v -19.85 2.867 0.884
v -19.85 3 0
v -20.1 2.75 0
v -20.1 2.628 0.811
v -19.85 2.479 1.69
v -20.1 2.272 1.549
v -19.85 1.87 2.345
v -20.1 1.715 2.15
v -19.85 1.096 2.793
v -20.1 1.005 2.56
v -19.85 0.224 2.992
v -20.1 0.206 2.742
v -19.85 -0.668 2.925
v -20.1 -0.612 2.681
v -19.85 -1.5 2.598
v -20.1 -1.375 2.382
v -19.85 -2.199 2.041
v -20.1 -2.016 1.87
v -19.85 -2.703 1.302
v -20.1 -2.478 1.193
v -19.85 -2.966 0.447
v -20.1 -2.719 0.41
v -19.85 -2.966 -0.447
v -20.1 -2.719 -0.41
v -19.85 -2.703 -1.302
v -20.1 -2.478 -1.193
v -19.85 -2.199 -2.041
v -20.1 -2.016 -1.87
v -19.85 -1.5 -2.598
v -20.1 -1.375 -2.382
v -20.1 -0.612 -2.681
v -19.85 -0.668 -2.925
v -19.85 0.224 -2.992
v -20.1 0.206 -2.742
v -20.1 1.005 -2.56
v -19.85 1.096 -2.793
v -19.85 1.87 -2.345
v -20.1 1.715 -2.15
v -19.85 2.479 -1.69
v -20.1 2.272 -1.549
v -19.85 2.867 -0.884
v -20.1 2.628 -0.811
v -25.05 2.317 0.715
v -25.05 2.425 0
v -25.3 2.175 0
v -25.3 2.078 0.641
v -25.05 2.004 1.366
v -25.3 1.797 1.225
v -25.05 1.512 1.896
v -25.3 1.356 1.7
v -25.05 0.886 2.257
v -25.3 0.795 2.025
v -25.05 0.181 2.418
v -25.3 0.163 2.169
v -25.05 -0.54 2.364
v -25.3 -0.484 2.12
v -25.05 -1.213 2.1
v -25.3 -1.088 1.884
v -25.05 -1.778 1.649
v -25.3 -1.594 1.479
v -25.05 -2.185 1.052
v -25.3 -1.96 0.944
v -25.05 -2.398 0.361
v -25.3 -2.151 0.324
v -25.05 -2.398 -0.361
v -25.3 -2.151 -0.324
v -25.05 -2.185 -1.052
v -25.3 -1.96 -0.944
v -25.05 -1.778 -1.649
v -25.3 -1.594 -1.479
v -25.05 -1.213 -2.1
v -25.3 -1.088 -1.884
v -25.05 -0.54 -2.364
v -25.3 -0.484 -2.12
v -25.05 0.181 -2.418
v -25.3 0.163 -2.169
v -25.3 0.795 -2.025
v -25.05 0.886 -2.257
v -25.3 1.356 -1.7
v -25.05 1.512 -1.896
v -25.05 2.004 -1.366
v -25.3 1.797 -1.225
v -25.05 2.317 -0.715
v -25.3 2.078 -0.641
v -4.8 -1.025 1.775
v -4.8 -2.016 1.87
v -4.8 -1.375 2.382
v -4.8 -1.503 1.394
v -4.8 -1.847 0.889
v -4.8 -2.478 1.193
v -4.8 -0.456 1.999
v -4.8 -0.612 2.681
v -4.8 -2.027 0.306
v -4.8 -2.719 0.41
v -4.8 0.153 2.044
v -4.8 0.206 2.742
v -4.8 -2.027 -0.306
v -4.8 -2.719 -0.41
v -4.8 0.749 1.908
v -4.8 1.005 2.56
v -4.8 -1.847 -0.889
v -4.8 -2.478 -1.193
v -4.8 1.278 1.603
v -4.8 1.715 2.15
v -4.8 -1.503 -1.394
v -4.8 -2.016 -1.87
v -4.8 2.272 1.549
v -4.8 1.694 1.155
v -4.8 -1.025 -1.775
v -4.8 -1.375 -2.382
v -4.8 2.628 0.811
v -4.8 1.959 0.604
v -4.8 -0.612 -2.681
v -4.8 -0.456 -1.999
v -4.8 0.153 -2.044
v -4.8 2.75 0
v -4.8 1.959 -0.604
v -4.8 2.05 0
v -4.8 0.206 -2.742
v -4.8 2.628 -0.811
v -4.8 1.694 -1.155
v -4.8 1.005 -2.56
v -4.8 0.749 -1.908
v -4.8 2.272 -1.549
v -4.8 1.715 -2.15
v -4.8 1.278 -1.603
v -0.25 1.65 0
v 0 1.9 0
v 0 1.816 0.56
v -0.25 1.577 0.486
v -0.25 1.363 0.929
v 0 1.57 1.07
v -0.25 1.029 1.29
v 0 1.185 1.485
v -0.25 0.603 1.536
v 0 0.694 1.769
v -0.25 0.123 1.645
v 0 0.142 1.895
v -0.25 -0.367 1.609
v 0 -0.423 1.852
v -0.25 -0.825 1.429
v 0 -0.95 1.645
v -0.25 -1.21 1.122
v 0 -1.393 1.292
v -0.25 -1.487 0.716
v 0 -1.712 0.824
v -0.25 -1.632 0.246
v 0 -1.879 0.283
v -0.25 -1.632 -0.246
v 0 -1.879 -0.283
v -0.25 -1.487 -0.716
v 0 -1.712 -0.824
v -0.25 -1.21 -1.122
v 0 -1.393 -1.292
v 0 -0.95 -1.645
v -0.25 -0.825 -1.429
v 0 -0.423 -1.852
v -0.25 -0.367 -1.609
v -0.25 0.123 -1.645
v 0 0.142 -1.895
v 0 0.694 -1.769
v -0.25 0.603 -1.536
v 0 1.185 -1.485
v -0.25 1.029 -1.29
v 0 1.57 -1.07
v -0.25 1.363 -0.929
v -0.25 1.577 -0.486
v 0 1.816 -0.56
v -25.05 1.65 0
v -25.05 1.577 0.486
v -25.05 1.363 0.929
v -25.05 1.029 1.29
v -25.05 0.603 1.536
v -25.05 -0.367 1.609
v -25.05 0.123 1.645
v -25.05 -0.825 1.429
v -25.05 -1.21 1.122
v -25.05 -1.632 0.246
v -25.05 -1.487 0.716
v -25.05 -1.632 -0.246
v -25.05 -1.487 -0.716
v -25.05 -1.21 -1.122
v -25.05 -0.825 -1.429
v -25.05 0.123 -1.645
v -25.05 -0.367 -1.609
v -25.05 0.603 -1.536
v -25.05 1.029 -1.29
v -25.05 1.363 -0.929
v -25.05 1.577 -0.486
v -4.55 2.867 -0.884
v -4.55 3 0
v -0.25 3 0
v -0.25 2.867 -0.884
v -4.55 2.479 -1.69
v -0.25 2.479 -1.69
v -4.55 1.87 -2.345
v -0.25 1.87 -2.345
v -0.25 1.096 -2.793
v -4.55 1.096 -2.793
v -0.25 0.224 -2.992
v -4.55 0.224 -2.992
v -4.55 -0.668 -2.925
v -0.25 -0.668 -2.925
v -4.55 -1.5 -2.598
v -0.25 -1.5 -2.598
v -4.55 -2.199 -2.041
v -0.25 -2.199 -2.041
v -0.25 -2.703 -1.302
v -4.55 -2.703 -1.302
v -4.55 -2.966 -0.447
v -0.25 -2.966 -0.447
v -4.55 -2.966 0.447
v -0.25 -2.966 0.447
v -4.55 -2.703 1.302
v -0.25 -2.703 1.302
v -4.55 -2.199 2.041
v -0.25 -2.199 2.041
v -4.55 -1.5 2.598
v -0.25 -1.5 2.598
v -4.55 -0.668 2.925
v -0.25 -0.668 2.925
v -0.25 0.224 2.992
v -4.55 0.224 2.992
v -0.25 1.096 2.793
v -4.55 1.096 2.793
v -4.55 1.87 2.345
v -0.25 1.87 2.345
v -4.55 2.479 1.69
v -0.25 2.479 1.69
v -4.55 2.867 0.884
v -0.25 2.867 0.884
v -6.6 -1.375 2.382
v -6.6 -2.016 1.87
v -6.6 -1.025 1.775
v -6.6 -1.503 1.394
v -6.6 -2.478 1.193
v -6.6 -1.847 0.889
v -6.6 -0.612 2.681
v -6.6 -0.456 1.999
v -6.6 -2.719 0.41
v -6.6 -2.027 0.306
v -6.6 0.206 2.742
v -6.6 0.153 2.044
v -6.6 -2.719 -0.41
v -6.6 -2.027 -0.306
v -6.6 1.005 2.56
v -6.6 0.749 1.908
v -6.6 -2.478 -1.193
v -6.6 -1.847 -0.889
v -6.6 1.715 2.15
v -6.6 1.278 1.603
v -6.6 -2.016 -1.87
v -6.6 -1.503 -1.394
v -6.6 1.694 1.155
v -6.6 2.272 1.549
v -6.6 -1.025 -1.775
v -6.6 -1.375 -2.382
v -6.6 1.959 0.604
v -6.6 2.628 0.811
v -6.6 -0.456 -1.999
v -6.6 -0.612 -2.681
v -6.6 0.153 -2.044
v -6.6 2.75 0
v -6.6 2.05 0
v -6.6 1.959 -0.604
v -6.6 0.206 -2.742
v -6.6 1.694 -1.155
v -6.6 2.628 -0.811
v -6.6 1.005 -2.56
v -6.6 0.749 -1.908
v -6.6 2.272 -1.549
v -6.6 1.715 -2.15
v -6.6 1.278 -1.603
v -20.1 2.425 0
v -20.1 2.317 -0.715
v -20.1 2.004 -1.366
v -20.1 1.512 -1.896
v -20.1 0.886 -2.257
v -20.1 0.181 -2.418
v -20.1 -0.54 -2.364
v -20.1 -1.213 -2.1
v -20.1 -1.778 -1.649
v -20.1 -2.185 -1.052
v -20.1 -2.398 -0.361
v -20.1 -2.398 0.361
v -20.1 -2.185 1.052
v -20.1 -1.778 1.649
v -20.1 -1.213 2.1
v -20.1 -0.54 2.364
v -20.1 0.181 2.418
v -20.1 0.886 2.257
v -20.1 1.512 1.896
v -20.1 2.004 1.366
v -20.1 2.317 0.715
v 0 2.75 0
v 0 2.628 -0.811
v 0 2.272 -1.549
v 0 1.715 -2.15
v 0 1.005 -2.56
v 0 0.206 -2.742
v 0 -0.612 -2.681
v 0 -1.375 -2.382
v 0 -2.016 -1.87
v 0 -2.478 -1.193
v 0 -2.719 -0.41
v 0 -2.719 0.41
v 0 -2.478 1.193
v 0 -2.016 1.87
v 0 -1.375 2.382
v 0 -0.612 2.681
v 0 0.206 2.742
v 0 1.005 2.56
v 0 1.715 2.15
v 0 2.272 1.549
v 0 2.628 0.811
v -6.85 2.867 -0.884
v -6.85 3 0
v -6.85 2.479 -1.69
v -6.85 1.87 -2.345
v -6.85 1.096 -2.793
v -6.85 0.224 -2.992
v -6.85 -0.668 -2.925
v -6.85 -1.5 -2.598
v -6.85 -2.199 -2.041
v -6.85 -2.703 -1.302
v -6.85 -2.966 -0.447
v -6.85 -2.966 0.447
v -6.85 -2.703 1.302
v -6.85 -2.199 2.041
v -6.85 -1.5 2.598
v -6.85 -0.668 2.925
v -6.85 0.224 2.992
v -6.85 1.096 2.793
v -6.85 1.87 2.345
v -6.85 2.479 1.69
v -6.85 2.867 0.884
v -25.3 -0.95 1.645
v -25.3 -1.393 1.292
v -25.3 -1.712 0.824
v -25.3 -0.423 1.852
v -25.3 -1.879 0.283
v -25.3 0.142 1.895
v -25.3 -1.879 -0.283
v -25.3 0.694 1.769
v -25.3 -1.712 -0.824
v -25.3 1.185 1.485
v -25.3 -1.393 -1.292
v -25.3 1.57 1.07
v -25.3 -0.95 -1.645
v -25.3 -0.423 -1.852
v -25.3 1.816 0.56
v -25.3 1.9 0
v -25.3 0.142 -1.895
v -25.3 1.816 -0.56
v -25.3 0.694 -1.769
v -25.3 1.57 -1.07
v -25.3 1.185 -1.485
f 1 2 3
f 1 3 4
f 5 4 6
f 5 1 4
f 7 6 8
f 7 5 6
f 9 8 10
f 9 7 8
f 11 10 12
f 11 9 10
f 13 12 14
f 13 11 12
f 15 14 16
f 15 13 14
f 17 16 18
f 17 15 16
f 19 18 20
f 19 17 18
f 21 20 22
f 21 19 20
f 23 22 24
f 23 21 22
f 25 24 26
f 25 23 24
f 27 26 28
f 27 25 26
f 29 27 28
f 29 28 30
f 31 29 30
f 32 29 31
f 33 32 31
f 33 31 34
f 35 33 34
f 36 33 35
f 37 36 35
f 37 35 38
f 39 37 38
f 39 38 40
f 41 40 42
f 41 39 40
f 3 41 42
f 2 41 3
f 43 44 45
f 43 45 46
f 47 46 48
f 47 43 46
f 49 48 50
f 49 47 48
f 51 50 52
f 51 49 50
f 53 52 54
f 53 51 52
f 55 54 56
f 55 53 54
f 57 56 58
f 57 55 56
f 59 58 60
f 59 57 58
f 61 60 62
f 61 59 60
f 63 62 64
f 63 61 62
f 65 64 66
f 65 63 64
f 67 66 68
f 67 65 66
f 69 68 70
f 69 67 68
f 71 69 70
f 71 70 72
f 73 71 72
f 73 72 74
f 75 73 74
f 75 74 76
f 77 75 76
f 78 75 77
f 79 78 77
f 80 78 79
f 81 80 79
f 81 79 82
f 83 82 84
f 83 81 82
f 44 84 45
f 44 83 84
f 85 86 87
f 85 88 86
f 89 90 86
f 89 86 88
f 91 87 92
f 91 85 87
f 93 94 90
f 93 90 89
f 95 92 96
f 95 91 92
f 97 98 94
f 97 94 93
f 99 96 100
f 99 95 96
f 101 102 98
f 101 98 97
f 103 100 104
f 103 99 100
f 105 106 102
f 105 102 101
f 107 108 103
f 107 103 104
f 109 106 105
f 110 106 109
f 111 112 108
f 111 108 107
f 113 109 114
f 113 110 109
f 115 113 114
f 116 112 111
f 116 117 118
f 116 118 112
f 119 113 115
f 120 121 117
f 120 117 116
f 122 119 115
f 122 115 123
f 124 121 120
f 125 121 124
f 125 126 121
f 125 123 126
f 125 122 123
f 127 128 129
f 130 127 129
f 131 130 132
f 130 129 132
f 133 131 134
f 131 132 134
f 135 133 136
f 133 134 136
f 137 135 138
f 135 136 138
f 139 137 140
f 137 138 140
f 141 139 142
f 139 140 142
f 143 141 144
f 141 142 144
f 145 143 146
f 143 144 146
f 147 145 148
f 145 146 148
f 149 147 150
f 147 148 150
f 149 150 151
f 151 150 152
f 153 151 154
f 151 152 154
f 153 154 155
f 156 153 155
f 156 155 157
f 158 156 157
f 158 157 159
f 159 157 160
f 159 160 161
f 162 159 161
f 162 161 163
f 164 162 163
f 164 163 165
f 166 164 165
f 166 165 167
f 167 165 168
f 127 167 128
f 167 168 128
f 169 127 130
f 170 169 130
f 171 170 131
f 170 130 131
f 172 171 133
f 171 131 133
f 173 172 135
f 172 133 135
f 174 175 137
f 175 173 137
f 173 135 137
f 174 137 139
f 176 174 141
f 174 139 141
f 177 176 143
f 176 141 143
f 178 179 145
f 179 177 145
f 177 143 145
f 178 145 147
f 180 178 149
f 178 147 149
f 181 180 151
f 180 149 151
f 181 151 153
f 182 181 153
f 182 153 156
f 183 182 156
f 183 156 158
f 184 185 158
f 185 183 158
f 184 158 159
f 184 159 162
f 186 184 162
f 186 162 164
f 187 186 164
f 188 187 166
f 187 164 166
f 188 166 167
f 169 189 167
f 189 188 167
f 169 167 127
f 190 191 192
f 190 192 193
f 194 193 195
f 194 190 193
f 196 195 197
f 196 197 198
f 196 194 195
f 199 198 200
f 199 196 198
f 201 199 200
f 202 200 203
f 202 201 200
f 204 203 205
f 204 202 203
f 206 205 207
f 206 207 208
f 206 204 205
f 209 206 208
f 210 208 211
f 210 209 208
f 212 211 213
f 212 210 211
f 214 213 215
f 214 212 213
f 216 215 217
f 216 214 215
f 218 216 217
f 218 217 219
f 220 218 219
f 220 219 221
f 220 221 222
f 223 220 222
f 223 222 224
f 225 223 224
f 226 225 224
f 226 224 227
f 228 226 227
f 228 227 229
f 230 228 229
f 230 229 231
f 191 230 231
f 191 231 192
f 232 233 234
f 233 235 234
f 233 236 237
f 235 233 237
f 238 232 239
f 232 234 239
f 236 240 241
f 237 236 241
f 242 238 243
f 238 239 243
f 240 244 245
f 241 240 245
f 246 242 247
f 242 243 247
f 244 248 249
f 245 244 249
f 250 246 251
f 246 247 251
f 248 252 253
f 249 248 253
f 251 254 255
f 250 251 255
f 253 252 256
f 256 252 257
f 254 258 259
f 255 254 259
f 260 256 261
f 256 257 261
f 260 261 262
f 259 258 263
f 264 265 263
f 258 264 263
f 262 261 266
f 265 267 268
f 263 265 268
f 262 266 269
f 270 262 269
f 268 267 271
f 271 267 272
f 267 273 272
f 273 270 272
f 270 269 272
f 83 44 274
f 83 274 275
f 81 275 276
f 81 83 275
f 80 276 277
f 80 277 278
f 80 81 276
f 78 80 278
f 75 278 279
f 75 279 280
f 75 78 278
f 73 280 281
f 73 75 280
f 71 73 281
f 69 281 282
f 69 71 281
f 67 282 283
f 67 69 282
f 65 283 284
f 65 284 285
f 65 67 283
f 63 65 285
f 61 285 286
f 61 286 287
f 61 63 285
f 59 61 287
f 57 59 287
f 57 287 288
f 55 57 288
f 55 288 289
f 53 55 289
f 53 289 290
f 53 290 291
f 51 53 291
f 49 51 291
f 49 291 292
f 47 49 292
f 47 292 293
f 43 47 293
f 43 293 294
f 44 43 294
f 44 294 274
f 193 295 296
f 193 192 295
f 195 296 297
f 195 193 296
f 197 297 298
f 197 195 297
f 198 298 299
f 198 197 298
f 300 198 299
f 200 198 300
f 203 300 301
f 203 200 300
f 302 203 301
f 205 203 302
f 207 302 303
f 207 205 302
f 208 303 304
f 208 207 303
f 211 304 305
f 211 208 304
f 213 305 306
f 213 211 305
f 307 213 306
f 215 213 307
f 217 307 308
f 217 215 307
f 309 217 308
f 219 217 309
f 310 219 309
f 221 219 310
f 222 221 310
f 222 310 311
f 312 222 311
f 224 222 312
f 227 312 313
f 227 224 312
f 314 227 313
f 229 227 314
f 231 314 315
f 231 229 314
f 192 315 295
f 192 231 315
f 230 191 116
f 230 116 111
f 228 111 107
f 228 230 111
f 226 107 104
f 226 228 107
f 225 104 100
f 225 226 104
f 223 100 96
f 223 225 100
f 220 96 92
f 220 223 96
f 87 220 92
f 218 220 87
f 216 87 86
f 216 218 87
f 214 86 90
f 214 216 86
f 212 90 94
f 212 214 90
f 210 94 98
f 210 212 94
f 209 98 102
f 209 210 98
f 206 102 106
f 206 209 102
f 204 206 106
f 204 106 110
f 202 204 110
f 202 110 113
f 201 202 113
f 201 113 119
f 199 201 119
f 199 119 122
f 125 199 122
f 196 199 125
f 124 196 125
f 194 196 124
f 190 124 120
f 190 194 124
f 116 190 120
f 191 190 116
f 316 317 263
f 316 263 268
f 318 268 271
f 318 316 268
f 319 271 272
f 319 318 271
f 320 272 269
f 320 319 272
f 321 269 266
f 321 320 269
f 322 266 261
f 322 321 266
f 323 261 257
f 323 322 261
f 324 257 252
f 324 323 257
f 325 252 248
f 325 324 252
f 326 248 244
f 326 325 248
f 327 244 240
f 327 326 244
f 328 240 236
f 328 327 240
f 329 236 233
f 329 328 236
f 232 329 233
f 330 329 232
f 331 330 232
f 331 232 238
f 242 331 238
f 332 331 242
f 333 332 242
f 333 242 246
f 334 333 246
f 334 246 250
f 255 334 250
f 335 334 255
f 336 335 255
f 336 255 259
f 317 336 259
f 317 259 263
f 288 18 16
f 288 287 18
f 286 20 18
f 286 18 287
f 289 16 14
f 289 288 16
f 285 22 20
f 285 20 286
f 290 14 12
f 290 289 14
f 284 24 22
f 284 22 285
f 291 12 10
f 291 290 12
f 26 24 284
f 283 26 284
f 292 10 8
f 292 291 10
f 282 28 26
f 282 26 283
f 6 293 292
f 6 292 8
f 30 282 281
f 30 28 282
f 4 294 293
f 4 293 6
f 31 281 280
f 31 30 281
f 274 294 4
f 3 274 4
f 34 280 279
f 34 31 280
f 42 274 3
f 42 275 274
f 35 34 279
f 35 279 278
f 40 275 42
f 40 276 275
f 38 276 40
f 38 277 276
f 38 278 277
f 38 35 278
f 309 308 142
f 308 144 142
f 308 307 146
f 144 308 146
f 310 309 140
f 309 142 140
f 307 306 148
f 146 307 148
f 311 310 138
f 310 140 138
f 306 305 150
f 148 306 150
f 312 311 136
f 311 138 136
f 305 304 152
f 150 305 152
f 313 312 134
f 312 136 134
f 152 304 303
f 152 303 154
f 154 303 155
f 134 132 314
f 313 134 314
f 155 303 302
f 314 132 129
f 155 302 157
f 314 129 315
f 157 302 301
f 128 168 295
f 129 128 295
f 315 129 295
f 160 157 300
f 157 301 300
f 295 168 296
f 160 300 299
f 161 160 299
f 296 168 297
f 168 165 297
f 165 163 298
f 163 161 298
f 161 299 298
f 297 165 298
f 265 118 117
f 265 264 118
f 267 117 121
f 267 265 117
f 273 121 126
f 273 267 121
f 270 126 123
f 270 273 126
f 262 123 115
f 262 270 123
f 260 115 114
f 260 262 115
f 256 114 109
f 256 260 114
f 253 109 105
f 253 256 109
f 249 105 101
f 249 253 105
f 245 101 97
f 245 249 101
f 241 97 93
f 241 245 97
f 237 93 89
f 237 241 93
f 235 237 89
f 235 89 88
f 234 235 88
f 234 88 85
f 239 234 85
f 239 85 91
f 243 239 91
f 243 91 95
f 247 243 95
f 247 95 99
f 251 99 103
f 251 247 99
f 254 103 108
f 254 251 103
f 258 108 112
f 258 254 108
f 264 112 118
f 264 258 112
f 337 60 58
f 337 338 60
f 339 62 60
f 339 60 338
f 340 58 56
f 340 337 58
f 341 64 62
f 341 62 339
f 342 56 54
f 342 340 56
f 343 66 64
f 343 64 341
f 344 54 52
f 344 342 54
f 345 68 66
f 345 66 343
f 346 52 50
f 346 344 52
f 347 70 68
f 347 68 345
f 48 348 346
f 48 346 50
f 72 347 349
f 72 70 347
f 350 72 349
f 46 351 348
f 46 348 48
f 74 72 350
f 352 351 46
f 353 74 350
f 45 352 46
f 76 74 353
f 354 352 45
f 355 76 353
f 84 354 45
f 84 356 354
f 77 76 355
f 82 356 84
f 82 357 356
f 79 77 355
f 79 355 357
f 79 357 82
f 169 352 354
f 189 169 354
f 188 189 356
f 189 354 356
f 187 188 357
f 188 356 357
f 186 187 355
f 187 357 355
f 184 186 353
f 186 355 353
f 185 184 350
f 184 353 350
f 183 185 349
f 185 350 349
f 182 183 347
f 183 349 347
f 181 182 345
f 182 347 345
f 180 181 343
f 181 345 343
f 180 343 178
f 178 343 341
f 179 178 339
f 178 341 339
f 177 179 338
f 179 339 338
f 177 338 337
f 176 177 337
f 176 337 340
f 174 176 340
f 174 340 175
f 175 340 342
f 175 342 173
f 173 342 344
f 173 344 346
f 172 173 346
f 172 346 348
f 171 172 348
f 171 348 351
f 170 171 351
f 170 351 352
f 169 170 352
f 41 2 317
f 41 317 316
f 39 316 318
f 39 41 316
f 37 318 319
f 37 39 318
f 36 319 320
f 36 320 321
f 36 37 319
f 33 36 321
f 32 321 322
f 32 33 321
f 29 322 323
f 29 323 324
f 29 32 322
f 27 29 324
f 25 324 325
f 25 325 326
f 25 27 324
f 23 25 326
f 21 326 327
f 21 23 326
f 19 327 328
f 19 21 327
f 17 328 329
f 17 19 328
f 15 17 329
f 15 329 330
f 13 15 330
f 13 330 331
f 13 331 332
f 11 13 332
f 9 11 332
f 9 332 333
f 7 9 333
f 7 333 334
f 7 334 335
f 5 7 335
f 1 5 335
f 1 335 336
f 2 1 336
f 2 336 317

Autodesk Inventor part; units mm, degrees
ref_plane "YZ Plane" through (0, 0, 0) normal (1, 0, 0) x (0, 1, 0)
ref_plane "XZ Plane" through (0, 0, 0) normal (0, 1, 0) x (-1, 0, 0)
ref_plane "XY Plane" through (0, 0, 0) normal (0, 0, 1) x (1, 0, 0)
sketch "Esquisse1" plane through (0, 0, 0) normal (0, 0, 1) x (1, 0, 0)
  line L0 (0, 1.65) -> (0, 3)
  line L1 (0, 3) -> (-4.8, 3)
  line L2 (-4.8, 3) -> (-4.8, 2.05)
  line L3 (-4.8, 2.05) -> (-6.6, 2.05)
  line L4 (-6.6, 2.05) -> (-6.6, 3)
  line L5 (-6.6, 3) -> (-20.1, 3)
  line L6 (-20.1, 3) -> (-20.1, 2.425)
  line L7 (-20.1, 2.425) -> (-25.3, 2.425)
  line L8 (-25.3, 2.425) -> (-25.3, 1.65)
  line L9 (-25.3, 1.65) -> (0, 1.65)
  line L10 (0, 0) -> (-19.9979, 0)
  dimension "d0" = 6
  dimension "d1" = 3.3
  dimension "d2" = 4.1
  dimension "d3" = 4.8
  dimension "d4" = 13.5
  dimension "d5" = 1.8
  dimension "d6" = 4.85
  dimension "d7" = 25.3
revolve "Révolution1" add sketch "Esquisse1" angle 360 about axis through (0, 0, 0) along (-1, 0, 0)
chamfer "Chanfrein1" distance 0.25 angle 45 7 edges at (0, -1.65, 0) (0, -3, 0) (-25.3, -2.425, 0) (-25.3, -1.65, 0) (-4.8, -3, 0) (-6.6, -3, 0) (-20.1, -3, 0)
thread "Filetage1" size "M6x1" class "6g" standard "ANSI Metric M Profile" full length
thread "Filetage2" size "M6x1" class "6g" standard "ANSI Metric M Profile" full length
properties part number "Vis de raccord" material "Acier"
